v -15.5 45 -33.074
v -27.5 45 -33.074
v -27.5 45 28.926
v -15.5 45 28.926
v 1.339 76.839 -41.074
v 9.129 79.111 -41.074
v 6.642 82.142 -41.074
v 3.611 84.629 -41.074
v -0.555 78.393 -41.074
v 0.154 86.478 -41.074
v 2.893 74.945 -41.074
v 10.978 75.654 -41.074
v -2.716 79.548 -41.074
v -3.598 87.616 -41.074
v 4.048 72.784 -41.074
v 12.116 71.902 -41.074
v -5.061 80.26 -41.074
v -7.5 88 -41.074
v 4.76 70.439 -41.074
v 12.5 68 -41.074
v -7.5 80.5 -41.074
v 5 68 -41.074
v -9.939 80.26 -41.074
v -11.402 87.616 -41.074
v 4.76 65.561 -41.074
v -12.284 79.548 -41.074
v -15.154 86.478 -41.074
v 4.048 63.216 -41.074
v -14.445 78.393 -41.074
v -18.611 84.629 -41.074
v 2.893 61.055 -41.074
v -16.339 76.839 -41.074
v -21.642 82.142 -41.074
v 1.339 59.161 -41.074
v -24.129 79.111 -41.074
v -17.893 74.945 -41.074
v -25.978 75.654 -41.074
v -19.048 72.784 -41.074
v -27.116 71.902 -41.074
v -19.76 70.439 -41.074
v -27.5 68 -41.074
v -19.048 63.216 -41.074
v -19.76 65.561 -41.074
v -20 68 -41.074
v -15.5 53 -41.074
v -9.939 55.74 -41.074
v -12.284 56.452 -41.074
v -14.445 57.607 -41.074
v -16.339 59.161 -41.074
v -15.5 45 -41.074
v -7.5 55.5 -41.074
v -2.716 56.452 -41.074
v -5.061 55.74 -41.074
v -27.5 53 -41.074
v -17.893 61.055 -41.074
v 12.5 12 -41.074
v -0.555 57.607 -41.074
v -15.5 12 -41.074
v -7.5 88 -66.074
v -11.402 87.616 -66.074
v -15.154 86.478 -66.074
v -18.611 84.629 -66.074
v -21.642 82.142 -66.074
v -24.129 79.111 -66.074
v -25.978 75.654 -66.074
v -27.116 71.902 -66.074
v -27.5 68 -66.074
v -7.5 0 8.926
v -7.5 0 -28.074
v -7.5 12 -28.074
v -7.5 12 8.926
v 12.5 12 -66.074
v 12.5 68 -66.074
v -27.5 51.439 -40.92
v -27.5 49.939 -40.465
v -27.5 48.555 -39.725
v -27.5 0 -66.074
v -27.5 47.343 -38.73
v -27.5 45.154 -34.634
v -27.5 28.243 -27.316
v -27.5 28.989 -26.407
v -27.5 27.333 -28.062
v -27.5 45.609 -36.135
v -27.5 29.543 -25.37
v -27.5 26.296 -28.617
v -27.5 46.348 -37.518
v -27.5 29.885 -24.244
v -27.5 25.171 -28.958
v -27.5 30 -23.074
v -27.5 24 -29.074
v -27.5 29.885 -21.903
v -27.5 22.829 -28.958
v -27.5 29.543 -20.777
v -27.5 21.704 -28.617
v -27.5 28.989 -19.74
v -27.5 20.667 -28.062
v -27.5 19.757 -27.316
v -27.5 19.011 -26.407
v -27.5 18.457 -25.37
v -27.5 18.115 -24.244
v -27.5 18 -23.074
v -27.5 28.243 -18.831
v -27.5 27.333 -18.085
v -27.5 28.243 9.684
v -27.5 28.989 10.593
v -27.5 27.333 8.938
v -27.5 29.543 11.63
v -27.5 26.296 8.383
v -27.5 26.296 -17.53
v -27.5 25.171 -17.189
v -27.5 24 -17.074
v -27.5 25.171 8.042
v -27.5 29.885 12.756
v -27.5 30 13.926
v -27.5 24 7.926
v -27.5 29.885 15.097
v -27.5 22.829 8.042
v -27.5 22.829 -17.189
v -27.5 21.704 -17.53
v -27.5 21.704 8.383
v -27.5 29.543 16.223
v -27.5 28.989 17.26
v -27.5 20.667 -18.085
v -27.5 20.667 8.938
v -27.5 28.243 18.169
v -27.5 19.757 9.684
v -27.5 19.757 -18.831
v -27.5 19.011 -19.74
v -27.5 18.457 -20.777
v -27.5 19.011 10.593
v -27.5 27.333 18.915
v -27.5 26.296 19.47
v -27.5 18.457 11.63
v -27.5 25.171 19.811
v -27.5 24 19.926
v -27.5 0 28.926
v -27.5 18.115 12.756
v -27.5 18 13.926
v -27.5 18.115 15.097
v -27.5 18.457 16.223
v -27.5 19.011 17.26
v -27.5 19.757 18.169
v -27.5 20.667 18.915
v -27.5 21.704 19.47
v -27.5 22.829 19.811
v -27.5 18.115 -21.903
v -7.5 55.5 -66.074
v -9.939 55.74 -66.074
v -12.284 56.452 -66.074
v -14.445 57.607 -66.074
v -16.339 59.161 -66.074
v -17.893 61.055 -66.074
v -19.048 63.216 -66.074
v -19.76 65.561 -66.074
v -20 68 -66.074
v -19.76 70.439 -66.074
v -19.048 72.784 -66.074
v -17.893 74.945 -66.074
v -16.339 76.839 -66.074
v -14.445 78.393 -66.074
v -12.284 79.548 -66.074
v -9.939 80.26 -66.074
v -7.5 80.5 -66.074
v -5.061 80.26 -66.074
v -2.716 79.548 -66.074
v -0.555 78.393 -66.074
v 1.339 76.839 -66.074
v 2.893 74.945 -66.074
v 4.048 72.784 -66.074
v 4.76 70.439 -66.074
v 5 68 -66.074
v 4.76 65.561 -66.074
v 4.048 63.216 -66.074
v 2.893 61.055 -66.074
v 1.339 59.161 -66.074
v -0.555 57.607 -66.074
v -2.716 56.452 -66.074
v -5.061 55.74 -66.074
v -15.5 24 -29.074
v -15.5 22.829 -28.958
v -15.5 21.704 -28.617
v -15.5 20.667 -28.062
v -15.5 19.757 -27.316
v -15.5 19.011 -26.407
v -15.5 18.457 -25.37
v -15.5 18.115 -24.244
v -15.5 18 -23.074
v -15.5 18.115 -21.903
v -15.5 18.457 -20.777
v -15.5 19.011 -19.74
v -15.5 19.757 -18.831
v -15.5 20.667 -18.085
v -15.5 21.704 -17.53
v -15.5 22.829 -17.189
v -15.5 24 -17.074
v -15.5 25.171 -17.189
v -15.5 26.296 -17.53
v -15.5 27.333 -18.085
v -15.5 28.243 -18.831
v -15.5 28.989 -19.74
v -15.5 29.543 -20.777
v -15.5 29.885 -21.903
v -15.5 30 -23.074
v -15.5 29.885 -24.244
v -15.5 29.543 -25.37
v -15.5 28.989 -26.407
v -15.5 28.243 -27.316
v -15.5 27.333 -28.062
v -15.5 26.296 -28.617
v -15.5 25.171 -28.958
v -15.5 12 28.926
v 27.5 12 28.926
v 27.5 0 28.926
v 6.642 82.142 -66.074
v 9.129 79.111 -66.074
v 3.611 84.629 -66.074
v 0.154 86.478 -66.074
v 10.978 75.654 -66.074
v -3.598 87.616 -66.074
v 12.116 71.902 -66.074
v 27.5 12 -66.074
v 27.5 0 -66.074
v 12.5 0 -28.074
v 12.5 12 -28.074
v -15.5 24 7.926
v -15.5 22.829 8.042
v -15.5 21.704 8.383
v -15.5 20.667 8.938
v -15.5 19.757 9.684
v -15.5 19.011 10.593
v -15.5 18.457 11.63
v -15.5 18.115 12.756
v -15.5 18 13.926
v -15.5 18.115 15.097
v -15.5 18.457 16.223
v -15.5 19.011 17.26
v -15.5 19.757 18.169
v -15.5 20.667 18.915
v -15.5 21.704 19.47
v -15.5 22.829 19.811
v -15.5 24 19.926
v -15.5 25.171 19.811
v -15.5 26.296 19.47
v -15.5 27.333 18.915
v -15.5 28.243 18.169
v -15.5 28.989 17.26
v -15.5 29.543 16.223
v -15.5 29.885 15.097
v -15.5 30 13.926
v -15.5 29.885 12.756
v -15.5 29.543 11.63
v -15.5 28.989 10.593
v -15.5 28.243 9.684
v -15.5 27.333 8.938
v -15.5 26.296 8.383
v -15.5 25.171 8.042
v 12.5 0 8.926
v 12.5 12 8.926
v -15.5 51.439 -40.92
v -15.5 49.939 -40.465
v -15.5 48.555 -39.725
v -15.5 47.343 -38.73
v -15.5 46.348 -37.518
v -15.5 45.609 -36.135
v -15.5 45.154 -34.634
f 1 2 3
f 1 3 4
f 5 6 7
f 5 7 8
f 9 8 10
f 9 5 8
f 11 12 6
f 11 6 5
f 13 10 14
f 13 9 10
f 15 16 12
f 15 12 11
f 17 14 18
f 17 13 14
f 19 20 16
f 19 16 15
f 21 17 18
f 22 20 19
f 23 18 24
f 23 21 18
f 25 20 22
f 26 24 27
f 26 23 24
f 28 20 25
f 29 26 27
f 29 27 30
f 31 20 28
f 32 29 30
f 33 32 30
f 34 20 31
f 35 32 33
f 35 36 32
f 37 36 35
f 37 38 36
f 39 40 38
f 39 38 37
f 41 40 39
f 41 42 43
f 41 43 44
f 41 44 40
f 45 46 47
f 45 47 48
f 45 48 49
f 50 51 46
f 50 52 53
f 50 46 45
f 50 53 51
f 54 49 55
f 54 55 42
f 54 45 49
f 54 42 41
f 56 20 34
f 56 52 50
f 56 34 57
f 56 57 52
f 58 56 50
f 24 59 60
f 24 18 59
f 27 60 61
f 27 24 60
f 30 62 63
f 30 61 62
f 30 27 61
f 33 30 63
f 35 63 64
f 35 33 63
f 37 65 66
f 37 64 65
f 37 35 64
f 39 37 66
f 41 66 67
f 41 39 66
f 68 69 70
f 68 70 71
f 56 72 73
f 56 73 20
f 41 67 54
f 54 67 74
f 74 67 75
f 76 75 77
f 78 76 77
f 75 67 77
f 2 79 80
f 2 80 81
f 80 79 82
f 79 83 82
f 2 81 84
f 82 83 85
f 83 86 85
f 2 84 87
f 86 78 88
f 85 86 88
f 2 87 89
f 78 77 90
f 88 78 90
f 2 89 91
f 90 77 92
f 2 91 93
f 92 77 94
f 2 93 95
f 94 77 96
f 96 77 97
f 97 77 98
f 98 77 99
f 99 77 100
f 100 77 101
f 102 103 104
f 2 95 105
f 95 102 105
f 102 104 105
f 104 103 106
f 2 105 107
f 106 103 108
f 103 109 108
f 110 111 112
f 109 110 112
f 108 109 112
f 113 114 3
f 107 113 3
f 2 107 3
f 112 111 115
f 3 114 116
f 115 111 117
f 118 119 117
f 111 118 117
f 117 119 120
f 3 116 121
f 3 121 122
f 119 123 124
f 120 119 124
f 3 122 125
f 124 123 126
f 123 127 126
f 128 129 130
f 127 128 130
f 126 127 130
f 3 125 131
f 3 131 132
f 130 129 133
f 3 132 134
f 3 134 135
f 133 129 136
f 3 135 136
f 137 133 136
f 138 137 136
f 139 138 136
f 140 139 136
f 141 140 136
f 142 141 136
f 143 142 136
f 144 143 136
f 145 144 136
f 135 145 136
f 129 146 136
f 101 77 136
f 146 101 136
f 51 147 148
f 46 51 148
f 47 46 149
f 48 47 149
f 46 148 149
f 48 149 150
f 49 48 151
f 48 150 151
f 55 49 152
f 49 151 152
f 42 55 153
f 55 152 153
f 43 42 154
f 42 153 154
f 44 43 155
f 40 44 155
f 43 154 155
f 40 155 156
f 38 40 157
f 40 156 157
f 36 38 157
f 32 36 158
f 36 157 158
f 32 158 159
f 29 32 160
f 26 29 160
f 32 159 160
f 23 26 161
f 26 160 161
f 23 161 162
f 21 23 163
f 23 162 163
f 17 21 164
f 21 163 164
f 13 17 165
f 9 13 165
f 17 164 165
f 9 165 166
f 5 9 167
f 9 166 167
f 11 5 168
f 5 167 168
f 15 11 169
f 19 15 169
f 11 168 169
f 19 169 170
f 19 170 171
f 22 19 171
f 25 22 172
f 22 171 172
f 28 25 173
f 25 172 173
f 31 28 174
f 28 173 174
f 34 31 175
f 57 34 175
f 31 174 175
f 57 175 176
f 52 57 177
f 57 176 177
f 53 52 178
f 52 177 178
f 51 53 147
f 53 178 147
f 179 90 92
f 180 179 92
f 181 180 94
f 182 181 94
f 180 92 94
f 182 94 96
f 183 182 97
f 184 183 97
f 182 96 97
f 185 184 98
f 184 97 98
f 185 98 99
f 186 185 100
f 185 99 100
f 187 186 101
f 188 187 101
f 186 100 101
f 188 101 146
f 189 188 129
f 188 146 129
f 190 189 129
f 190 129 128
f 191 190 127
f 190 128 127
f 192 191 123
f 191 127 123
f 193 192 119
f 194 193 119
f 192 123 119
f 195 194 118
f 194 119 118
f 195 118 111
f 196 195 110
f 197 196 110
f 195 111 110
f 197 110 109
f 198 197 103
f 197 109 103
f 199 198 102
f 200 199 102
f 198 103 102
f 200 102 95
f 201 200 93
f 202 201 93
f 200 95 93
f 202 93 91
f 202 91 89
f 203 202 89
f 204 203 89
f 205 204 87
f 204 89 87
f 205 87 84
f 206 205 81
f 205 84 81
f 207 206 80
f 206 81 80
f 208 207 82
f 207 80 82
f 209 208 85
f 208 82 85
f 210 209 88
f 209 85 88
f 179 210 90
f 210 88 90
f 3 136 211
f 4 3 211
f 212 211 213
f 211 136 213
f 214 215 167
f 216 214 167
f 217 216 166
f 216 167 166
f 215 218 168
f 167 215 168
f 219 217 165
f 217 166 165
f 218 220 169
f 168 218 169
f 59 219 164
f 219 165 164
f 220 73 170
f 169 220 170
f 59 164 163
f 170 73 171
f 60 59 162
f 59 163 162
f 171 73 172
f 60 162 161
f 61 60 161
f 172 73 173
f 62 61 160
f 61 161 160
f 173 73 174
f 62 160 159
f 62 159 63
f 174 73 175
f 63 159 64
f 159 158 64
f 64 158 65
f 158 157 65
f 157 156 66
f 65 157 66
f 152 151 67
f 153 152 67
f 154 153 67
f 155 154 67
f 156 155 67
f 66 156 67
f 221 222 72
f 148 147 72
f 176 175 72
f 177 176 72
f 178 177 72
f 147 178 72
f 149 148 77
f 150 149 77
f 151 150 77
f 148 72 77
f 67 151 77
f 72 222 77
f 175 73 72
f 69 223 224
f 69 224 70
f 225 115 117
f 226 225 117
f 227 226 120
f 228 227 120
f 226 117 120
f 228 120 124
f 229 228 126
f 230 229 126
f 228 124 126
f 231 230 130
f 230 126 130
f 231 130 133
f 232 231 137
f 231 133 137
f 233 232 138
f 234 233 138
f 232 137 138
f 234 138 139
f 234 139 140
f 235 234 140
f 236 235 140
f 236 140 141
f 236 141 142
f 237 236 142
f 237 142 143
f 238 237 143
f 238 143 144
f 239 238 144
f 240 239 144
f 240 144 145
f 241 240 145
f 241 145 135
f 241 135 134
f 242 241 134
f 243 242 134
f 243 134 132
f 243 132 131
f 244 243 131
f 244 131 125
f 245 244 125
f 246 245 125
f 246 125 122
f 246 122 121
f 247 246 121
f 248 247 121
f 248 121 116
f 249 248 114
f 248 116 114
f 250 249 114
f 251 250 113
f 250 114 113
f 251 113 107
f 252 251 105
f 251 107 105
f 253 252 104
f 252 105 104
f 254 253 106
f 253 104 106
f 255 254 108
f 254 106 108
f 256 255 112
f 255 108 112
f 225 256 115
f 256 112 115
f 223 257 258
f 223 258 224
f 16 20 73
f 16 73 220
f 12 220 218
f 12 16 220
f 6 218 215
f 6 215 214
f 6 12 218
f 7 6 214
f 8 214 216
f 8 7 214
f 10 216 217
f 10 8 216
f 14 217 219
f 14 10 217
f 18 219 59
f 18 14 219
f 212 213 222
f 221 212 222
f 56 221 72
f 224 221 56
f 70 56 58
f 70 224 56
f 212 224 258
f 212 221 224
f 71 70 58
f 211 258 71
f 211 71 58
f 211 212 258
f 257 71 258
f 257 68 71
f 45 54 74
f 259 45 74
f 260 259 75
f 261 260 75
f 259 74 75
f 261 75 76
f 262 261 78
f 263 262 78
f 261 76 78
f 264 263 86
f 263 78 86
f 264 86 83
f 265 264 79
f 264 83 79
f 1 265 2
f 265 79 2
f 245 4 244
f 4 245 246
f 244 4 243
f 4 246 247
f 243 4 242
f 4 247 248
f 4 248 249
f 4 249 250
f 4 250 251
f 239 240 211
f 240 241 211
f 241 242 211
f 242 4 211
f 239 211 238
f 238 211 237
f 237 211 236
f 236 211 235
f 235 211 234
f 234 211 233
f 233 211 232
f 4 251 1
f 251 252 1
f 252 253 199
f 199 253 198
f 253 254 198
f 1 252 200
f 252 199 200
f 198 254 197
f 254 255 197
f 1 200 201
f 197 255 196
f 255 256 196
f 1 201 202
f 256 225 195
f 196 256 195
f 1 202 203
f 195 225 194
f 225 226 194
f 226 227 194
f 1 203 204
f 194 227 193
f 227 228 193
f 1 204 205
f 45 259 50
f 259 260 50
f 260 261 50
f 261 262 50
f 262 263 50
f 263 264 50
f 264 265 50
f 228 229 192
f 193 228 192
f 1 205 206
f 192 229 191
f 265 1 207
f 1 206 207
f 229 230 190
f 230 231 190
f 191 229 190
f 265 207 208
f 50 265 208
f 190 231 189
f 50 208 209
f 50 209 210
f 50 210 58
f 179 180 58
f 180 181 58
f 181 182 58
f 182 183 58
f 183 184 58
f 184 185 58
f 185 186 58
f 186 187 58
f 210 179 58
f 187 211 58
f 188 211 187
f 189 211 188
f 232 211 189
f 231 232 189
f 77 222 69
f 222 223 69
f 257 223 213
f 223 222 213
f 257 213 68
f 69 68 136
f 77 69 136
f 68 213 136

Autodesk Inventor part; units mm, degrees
ref_plane "YZ Plane" through (0, 0, 0) normal (1, 0, 0) x (0, 1, 0)
ref_plane "XZ Plane" through (0, 0, 0) normal (0, 1, 0) x (-1, 0, 0)
ref_plane "XY Plane" through (0, 0, 0) normal (0, 0, 1) x (1, 0, 0)
sketch "Szkic1" plane through (0, 0, 0) normal (0, 1, 0) x (-1, 0, 0)
  line L0 (27.5, 28.9264) -> (-27.5, 28.9264)
  line L1 (-27.5, 28.9264) -> (-27.5, -66.0736)
  line L2 (-27.5, -66.0736) -> (27.5, -66.0736)
  line L3 (27.5, -66.0736) -> (27.5, 28.9264)
  line L4 (-12.5, -28.0736) -> (7.5, -28.0736)
  line L5 (7.5, -28.0736) -> (7.5, 8.9264)
  line L6 (7.5, 8.9264) -> (-12.5, 8.9264)
  line L7 (-12.5, 8.9264) -> (-12.5, -28.0736)
  point P0 (0, 0)
  point P1 (27.5, -18.5736)
  dimension "d0" = 55
  dimension "d1" = 95
  dimension "d3" = 20
  dimension "d4" = 37
  dimension "d5" = 38
  dimension "d6" = 40
extrude "Wyciągnięcie proste1" add sketch "Szkic1" along normal blind 12
sketch "Szkic2" plane through (0, 12, 0) normal (0, 1, 0) x (1, 0, 0)
  line L0 (-27.5, 66.0736) -> (-27.5, -28.9264) projected
  line L1 (-27.5, 66.0736) -> (12.5, 66.0736)
  line L2 (12.5, 66.0736) -> (12.5, 41.0736)
  line L3 (12.5, 41.0736) -> (-27.5, 41.0736)
  line L4 (-27.5, 41.0736) -> (-27.5, 66.0736)
  point P0 (0, 0)
  dimension "d9" = 40
  dimension "d10" = 25
extrude "Wyciągnięcie proste2" add sketch "Szkic2" along normal blind 76
sketch "Szkic3" plane through (0, 12, 0) normal (0, 1, 0) x (1, 0, 0)
  line L0 (-27.5, 66.0736) -> (-27.5, -28.9264) projected
  line L1 (12.5, 41.0736) -> (-27.5, 41.0736) projected
  line L2 (-27.5, -28.9264) -> (-15.5, -28.9264)
  line L3 (-15.5, -28.9264) -> (-15.5, 41.0736)
  line L4 (-15.5, 41.0736) -> (-27.5, 41.0736)
  line L5 (-27.5, 41.0736) -> (-27.5, -28.9264)
  point P0 (0, 0)
  dimension "d13" = 12
extrude "Wyciągnięcie proste3" add sketch "Szkic3" along normal blind 33
sketch "Szkic4" plane through (-15.5, 12, 28.9264) normal (1, 0, 0) x (0, 0, -1)
  line L0 (0, 0) -> (95, 0) projected
  point P0 (28.9264, -12)
  point P1 (15, 12)
  point P2 (52, 12)
  dimension "d16" = 12
  dimension "d17" = 12
sketch "Szkic5" plane through (-27.5, 88, -41.0736) normal (0, 0, 1) x (1, 0, 0)
  point P0 (27.5, -88)
  point P1 (20, -20)
hole "Otwór1" at (-15.5, 24, 13.9264) at (-15.5, 24, -23.0736) direction (-1, 0, 0) diameter 12 end through all
hole "Otwór2" at (-7.5, 68, -41.0736) direction (0, 0, -1) diameter 25 end through all
full round fillet "Zaokrąglenie pełne1" first side at (12.5, 62.6667, -49.4069) centre faces at (-14.1667, 88, -57.7402) second side at (-27.5, 44.3333, -57.7402)
fillet "Zaokrąglenie powierzchni1" radius 8 1 edges at (-21.5, 45, -41.0736)
